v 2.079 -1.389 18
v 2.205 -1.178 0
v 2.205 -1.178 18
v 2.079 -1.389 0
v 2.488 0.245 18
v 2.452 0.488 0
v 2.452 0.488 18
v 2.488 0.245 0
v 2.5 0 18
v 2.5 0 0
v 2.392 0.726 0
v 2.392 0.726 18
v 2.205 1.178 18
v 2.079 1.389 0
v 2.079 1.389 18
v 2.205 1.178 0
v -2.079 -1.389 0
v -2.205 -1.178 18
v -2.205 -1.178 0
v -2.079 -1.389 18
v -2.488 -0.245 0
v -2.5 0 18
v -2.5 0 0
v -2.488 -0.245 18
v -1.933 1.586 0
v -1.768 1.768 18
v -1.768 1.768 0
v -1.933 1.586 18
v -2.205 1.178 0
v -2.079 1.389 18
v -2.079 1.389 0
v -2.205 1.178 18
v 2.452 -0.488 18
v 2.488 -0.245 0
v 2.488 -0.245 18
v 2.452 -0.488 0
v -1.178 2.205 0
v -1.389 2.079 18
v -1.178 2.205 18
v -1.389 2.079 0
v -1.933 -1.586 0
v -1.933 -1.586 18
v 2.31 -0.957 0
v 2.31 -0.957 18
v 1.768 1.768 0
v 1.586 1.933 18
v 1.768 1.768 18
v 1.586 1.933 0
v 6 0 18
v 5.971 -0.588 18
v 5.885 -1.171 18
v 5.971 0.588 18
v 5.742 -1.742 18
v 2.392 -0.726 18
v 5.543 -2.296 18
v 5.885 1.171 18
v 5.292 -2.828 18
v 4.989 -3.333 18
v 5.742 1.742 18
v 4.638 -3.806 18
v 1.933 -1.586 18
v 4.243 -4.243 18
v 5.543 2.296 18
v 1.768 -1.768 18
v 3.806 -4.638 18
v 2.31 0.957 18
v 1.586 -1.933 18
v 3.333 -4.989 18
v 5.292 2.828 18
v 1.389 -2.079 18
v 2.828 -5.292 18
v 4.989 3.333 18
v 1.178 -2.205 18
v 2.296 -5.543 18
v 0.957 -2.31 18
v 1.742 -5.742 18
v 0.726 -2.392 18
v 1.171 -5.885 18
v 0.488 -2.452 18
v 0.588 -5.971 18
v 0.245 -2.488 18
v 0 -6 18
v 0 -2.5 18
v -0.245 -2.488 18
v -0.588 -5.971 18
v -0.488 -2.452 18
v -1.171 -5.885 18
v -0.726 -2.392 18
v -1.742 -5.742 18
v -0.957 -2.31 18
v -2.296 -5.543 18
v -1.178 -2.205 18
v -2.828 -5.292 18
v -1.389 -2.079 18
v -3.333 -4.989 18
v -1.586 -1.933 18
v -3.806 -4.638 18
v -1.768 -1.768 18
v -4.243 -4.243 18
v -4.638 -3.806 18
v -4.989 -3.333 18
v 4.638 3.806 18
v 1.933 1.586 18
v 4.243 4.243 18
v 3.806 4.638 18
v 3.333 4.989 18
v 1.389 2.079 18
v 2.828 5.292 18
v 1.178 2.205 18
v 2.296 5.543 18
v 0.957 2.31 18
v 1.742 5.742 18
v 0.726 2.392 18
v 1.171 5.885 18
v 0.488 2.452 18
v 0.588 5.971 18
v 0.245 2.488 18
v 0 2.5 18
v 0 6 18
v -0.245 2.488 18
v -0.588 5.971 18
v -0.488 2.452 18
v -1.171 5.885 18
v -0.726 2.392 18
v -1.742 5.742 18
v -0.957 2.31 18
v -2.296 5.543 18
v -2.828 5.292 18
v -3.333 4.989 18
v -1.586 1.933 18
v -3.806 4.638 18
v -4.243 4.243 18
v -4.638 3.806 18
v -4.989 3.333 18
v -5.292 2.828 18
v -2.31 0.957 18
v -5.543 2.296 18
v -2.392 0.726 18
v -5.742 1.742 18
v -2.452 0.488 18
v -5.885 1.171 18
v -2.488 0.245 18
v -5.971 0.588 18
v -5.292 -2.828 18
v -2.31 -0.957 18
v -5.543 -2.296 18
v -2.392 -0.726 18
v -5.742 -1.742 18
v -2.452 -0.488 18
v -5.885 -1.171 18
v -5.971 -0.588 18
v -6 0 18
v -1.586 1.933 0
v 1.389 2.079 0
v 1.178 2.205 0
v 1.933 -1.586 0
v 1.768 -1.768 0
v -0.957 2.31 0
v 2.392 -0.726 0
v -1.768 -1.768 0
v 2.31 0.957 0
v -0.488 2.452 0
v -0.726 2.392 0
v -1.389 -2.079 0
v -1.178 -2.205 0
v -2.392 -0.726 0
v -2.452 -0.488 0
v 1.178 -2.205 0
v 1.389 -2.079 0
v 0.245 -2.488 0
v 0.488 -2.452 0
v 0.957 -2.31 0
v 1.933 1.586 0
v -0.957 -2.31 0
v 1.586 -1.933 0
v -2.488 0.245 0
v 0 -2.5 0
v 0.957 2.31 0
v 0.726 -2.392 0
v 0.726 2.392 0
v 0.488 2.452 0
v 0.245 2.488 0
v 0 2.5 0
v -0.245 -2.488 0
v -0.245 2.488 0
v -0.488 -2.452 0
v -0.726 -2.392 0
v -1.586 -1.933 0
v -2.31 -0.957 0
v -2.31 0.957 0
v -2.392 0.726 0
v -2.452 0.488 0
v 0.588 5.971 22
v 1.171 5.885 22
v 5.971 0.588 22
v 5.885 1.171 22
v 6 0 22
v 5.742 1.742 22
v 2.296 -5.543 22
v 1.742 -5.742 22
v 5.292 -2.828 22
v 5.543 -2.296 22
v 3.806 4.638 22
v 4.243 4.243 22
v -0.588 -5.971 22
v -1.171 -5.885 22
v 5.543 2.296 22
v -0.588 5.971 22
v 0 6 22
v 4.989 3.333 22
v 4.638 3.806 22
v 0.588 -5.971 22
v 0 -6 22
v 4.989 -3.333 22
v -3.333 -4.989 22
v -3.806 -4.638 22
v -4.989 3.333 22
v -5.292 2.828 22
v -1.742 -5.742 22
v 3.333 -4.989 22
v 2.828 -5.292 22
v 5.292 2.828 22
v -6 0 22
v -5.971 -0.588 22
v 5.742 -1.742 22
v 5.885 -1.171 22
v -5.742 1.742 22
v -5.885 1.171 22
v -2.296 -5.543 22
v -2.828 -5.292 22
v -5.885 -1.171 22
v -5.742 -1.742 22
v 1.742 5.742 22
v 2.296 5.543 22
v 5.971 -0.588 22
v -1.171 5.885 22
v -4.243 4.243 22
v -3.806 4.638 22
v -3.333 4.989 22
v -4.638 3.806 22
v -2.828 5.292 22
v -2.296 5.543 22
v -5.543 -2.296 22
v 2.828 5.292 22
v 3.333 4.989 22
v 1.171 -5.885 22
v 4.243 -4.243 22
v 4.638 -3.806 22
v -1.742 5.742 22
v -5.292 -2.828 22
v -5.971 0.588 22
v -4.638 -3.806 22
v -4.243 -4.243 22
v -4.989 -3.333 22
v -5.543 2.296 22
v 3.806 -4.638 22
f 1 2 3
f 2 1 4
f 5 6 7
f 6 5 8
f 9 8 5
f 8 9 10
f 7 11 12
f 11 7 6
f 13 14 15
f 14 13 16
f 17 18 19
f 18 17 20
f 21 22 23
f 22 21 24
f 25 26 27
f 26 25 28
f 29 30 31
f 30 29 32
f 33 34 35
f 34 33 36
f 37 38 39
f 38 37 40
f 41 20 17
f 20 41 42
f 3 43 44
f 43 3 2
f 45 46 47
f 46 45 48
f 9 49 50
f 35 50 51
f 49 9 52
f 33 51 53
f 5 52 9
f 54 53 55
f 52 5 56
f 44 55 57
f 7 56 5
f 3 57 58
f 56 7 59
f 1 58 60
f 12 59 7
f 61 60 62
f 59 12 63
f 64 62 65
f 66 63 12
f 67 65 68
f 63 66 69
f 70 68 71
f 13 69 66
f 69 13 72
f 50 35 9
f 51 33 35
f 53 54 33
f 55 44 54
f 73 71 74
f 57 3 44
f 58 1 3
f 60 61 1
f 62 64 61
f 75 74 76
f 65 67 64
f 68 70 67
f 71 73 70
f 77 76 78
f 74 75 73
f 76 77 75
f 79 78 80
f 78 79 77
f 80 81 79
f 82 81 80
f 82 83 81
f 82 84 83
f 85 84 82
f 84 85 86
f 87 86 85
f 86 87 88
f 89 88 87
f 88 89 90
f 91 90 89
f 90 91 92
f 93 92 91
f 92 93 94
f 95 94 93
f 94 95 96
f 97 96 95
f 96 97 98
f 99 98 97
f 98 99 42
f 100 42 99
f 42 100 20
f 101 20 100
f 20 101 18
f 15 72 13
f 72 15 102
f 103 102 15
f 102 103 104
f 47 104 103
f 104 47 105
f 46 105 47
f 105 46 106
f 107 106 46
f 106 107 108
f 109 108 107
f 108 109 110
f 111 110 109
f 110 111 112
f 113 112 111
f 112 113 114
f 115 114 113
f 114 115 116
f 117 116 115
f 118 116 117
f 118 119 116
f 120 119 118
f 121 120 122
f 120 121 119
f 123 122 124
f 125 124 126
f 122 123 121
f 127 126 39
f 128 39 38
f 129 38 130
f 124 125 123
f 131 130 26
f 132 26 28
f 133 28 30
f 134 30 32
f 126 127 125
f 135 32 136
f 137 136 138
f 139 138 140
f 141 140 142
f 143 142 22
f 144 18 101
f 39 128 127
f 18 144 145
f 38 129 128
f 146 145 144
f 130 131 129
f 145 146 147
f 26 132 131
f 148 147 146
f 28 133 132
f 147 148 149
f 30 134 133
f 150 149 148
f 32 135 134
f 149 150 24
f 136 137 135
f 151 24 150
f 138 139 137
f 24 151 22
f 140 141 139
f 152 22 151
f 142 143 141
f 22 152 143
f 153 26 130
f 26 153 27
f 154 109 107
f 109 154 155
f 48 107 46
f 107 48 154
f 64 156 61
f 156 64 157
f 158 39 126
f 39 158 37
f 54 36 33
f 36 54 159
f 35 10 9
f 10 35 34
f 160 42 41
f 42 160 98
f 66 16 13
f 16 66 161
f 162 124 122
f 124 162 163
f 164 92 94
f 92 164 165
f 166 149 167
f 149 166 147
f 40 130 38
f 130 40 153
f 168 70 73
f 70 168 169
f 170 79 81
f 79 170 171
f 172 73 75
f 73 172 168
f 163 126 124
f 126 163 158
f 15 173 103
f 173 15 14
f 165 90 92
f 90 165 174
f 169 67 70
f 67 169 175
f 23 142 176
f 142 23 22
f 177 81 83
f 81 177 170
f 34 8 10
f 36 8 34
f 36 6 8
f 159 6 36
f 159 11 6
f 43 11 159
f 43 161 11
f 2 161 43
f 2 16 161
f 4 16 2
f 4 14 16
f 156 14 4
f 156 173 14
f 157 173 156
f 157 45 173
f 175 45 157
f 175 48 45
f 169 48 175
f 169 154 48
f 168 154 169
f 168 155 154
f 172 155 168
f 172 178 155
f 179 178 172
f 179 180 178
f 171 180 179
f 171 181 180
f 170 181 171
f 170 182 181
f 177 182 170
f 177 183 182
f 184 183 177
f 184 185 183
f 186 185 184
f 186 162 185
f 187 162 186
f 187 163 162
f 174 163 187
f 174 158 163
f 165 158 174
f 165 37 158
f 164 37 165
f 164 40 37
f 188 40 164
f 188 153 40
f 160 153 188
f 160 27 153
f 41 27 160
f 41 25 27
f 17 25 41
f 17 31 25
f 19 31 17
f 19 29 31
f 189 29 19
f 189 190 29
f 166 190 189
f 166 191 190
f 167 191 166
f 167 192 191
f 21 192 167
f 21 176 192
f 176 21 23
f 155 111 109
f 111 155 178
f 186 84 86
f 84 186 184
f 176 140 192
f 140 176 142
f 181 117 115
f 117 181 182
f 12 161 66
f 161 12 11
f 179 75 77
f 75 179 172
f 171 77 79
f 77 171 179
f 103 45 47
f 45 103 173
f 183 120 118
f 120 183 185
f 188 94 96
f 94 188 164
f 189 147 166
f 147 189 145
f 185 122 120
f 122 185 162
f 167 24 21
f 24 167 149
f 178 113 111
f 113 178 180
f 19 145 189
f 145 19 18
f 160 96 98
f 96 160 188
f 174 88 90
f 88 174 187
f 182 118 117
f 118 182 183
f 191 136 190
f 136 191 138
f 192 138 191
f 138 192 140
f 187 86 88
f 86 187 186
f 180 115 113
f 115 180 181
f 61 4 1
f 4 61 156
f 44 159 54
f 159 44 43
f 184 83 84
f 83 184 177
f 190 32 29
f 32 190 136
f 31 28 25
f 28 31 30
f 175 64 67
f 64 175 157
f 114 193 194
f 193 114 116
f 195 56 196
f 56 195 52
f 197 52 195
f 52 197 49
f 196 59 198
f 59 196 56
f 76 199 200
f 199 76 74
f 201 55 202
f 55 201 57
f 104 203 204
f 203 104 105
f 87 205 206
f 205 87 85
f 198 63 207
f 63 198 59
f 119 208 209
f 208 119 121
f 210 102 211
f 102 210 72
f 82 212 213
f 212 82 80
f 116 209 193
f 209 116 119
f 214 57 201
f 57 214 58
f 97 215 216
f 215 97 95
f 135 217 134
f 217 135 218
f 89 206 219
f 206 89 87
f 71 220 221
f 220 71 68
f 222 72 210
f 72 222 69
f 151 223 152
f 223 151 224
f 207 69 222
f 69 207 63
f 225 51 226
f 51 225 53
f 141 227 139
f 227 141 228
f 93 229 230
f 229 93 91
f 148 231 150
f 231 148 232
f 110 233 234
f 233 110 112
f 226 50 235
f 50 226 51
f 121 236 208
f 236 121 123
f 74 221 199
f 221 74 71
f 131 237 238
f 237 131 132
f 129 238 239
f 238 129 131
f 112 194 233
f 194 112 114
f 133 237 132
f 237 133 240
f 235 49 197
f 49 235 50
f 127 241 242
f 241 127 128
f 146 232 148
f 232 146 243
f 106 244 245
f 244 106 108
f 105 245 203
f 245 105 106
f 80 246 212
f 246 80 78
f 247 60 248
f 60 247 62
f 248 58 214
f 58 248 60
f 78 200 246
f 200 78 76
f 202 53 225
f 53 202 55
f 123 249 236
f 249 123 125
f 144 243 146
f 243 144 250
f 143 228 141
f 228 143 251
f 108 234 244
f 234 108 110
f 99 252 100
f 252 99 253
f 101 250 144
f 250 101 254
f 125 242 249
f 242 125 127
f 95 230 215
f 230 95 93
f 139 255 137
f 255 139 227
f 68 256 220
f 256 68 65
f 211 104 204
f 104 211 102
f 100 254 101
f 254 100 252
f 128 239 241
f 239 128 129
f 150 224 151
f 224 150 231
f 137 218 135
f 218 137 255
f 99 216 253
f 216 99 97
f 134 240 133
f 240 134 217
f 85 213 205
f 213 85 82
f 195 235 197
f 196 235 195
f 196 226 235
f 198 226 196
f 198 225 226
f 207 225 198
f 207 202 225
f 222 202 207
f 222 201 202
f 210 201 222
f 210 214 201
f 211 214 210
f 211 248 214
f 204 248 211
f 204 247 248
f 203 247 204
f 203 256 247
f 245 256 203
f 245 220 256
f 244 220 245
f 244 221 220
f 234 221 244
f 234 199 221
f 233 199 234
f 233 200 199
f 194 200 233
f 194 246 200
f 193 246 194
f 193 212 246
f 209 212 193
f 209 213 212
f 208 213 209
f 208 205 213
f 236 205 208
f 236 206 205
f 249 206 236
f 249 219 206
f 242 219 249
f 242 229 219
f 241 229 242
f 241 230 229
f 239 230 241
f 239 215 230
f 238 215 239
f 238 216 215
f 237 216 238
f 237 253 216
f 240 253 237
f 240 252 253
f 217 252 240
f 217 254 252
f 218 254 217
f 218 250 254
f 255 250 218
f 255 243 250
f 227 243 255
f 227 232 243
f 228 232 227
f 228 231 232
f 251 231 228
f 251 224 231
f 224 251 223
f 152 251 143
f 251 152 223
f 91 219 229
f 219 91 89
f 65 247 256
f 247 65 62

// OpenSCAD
// Generated with SolidPython2 for OpenSCAD task-014
$fn = 64;

union() {
	translate(v = [0, 0, 0]) {
		cylinder(h = 18, r = 2.5);
	}
	translate(v = [0, 0, 18]) {
		cylinder(h = 4, r = 6.0);
	}
}
